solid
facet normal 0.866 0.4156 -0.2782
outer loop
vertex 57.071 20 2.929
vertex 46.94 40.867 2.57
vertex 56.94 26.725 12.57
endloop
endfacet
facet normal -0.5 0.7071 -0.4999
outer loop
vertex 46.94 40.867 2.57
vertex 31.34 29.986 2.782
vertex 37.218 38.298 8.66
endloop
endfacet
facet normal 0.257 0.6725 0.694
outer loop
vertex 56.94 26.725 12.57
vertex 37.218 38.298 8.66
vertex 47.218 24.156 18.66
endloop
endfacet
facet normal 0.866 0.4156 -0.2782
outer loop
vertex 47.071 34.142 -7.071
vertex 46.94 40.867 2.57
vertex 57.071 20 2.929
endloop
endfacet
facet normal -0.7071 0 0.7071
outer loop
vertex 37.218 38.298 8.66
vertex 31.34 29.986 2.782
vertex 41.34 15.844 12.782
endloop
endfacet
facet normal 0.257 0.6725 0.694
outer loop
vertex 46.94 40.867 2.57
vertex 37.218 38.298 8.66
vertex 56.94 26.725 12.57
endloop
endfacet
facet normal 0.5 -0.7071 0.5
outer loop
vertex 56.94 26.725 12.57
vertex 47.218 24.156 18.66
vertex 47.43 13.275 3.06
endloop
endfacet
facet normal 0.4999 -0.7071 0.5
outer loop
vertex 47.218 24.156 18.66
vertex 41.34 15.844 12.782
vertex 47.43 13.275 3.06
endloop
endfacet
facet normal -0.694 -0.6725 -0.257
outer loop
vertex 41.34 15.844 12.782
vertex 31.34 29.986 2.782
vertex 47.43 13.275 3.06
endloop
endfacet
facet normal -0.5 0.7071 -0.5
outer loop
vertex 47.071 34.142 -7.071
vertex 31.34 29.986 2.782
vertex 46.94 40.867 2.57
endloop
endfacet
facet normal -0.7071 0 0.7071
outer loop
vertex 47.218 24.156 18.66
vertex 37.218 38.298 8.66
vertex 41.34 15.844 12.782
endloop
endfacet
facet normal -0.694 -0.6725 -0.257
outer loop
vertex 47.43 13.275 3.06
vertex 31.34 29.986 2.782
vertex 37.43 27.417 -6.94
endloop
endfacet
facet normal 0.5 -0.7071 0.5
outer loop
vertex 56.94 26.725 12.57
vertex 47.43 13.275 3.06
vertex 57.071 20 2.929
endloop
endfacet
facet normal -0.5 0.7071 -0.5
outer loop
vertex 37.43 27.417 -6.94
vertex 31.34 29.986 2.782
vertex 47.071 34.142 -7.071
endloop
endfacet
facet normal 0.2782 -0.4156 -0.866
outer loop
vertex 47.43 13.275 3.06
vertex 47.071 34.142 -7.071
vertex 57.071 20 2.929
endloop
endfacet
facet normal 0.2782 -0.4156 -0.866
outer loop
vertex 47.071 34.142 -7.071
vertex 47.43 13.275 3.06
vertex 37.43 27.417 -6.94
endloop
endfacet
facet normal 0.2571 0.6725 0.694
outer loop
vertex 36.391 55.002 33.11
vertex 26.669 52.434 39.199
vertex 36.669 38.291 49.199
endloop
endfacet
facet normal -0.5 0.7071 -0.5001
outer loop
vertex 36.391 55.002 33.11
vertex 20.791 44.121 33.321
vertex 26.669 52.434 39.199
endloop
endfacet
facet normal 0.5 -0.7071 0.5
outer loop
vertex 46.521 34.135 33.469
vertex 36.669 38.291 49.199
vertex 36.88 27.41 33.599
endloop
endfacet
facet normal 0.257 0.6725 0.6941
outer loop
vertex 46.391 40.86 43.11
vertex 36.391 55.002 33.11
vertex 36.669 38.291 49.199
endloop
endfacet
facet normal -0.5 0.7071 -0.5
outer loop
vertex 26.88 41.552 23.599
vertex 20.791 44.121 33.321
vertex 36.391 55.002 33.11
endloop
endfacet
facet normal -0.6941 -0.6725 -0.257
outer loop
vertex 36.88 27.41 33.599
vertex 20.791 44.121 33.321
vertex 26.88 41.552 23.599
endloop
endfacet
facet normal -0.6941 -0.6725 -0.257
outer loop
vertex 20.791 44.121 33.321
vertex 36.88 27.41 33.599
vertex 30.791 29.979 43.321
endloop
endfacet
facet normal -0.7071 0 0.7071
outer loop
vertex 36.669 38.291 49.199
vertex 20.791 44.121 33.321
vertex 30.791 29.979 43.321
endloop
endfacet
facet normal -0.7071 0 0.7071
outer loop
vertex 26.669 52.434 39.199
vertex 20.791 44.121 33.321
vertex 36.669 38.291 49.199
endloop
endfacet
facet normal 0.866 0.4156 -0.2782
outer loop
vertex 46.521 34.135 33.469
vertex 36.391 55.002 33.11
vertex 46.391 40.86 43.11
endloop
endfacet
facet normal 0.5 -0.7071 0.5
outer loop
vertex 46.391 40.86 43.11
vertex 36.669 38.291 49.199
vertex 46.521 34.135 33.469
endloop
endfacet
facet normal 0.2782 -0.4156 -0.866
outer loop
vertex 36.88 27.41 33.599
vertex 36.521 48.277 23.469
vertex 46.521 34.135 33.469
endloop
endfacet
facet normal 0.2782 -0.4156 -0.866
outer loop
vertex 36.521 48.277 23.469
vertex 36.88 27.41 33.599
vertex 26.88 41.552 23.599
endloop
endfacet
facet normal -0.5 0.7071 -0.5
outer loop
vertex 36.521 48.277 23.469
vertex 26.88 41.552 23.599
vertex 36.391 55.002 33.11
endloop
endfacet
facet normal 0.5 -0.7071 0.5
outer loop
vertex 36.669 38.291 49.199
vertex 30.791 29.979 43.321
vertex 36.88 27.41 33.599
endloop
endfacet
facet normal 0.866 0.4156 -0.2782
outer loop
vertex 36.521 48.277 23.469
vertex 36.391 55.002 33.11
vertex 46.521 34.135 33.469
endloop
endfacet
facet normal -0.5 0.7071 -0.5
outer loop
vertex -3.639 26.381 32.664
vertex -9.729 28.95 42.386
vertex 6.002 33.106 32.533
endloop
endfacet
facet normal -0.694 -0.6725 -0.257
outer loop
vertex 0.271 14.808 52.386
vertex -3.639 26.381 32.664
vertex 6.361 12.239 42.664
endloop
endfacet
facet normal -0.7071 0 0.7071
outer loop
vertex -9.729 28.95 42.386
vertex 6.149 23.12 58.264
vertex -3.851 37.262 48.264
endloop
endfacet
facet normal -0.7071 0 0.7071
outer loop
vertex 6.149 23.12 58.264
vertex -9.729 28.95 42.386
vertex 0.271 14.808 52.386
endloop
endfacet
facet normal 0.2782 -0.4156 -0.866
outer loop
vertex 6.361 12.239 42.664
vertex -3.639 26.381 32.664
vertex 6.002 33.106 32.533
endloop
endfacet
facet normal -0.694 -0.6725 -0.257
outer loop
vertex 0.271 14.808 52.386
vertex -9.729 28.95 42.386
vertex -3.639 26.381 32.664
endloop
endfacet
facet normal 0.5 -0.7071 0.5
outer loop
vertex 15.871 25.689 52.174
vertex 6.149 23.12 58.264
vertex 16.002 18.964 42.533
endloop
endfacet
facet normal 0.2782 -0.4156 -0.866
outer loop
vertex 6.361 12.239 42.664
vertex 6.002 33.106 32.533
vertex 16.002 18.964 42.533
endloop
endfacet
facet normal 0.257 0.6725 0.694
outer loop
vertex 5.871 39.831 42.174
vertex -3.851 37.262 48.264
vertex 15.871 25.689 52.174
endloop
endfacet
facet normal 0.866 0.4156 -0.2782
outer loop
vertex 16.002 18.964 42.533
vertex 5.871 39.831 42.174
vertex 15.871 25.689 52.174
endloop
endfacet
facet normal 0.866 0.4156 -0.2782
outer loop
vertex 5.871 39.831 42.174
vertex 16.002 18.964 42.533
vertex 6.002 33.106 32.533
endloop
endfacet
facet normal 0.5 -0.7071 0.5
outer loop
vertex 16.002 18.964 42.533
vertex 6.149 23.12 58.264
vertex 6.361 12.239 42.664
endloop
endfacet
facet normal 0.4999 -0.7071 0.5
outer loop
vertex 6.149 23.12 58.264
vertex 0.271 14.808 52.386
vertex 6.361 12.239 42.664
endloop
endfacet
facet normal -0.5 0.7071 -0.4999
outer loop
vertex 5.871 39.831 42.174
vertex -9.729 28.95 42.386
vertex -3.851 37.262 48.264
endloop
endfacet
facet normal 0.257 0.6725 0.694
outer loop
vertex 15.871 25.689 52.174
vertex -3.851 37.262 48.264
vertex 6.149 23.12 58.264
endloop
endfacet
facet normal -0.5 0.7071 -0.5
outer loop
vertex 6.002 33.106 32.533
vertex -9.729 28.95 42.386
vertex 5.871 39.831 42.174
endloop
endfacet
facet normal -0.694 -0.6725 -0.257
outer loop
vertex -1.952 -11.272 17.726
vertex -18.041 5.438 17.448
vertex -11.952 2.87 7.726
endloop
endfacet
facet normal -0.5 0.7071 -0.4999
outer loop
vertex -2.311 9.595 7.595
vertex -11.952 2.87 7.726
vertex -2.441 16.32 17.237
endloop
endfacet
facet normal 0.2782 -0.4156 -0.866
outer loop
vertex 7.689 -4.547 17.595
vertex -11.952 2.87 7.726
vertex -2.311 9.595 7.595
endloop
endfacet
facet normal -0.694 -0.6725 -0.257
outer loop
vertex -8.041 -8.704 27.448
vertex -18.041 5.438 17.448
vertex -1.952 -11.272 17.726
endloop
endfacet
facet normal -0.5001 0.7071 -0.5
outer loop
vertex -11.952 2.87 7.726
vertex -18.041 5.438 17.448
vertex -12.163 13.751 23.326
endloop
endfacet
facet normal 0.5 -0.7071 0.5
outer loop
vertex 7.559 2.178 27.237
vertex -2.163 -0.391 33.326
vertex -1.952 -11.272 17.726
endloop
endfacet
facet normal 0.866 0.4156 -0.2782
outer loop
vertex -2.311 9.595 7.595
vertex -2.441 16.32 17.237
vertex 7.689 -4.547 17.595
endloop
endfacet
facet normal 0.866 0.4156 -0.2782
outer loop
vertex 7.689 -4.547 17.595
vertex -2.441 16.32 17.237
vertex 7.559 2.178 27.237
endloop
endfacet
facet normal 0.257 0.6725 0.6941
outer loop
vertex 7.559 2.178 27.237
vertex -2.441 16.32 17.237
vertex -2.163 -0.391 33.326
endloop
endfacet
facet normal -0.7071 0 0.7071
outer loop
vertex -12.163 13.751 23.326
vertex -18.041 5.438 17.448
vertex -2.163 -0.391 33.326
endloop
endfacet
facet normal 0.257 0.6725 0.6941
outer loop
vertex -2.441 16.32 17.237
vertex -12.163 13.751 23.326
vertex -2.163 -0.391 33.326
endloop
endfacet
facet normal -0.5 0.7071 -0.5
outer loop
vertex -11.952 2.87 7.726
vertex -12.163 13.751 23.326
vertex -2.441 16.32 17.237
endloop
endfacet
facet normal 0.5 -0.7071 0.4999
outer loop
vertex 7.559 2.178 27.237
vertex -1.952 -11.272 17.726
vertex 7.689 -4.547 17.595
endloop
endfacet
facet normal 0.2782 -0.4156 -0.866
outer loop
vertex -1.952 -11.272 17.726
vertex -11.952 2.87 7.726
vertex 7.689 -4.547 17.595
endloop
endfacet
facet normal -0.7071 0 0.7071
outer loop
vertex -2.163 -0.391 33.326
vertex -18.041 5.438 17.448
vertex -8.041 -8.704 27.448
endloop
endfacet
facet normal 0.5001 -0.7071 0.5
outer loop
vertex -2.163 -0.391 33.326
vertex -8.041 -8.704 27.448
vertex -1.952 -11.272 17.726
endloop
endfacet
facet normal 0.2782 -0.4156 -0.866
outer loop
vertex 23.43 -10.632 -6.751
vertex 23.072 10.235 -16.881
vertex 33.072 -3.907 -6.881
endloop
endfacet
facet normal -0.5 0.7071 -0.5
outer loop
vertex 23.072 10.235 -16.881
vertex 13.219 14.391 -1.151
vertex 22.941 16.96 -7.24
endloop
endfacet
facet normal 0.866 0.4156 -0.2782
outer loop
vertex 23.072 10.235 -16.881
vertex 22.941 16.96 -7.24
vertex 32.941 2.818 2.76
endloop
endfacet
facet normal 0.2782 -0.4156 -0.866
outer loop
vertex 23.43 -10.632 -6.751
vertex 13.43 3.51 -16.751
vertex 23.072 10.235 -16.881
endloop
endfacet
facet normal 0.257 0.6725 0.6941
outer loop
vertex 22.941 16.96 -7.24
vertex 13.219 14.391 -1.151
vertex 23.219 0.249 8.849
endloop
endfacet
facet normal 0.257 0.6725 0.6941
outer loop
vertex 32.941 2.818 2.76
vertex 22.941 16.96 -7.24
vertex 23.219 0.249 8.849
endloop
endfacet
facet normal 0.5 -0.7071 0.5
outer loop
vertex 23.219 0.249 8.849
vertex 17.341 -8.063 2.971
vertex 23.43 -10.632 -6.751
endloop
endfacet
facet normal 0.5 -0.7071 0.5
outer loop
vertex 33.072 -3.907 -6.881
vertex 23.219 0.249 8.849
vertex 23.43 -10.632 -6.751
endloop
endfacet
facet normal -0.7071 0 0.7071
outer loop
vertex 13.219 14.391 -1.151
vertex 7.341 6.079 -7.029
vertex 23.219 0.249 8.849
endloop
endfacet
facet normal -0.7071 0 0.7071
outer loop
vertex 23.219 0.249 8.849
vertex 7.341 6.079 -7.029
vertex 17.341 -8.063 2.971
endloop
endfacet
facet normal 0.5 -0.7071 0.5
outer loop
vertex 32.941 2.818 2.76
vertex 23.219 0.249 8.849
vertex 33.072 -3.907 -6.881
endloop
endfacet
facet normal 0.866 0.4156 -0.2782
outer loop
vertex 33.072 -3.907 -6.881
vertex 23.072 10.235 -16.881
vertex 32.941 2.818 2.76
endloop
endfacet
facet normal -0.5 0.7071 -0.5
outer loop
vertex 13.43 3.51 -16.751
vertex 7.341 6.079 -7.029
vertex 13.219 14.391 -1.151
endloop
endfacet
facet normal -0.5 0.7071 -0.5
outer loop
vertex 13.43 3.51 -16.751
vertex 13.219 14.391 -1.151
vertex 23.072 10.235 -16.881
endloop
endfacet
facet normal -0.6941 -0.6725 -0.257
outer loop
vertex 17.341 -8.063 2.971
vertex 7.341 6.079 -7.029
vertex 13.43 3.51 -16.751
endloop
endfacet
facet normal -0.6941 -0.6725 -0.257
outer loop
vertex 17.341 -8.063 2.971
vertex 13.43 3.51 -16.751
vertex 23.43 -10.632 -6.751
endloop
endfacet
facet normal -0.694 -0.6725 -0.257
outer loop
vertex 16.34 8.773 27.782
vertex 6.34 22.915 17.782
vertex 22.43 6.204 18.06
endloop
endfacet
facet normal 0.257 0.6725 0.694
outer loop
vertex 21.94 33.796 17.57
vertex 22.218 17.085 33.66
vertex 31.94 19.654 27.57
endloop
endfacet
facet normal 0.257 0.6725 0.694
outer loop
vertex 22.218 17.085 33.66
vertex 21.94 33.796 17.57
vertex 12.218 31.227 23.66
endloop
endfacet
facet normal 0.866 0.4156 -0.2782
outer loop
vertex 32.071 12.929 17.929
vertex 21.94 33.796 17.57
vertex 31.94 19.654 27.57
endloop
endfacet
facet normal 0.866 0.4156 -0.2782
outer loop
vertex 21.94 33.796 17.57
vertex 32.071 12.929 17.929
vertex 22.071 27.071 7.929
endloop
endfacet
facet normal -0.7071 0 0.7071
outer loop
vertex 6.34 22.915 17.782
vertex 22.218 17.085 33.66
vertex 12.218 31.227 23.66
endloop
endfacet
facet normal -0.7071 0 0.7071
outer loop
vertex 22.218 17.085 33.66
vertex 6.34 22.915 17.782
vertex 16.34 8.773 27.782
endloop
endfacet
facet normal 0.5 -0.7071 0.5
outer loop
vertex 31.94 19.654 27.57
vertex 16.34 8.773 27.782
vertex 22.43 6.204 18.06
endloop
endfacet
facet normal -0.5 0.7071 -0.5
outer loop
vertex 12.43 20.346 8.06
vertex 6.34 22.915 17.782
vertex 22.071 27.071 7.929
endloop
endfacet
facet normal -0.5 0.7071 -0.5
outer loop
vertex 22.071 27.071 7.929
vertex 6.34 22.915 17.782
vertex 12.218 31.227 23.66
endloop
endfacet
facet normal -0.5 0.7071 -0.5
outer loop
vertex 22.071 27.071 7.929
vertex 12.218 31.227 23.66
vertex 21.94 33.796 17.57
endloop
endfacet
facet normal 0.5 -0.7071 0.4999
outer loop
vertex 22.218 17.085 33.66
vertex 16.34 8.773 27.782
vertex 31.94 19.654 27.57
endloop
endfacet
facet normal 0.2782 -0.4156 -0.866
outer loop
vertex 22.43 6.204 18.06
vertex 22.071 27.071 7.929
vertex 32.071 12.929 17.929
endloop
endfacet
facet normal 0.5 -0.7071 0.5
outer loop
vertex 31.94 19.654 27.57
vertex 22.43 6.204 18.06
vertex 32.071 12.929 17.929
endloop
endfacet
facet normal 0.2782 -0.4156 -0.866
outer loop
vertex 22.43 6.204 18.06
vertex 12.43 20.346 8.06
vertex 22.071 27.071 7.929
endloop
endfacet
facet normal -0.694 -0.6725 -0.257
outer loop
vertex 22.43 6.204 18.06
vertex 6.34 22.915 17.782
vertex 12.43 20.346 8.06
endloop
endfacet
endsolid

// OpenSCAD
$fn=5;
union()
{
	union()
	{
		translate([40,34.142136,0.0000014305115])
		{
			rotate(62.799435,[0.6785984,0.6785984,-0.2810847])
			{
				cylinder(h=20,d=20);
			}
		}
		translate([29.450409,48.277275,30.539705])
		{
			rotate(78.096016,[0.78391534,0.12416001,0.60832655])
			{
				cylinder(h=20,d=20);
			}
		}
		translate([-1.0691557,33.106155,39.60406])
		{
			rotate(132.46309,[0.48679218,-0.24803303,0.83756375])
			{
				cylinder(h=20,d=20);
			}
		}
		translate([-9.381691,9.594746,14.66644])
		{
			rotate(165.69812,[-0.2287747,0.44899577,-0.8637505])
			{
				cylinder(h=20,d=20);
			}
		}
		translate([16.000444,10.235022,-9.810211])
		{
			rotate(105.619995,[0.098184556,0.6199124,-0.77850395])
			{
				cylinder(h=20,d=20);
			}
		}
	}
	translate([15,27.071068,15])
	{
		rotate(62.799435,[0.6785984,0.6785984,-0.2810847])
		{
			cylinder(h=20,d=20);
		}
	}
}
